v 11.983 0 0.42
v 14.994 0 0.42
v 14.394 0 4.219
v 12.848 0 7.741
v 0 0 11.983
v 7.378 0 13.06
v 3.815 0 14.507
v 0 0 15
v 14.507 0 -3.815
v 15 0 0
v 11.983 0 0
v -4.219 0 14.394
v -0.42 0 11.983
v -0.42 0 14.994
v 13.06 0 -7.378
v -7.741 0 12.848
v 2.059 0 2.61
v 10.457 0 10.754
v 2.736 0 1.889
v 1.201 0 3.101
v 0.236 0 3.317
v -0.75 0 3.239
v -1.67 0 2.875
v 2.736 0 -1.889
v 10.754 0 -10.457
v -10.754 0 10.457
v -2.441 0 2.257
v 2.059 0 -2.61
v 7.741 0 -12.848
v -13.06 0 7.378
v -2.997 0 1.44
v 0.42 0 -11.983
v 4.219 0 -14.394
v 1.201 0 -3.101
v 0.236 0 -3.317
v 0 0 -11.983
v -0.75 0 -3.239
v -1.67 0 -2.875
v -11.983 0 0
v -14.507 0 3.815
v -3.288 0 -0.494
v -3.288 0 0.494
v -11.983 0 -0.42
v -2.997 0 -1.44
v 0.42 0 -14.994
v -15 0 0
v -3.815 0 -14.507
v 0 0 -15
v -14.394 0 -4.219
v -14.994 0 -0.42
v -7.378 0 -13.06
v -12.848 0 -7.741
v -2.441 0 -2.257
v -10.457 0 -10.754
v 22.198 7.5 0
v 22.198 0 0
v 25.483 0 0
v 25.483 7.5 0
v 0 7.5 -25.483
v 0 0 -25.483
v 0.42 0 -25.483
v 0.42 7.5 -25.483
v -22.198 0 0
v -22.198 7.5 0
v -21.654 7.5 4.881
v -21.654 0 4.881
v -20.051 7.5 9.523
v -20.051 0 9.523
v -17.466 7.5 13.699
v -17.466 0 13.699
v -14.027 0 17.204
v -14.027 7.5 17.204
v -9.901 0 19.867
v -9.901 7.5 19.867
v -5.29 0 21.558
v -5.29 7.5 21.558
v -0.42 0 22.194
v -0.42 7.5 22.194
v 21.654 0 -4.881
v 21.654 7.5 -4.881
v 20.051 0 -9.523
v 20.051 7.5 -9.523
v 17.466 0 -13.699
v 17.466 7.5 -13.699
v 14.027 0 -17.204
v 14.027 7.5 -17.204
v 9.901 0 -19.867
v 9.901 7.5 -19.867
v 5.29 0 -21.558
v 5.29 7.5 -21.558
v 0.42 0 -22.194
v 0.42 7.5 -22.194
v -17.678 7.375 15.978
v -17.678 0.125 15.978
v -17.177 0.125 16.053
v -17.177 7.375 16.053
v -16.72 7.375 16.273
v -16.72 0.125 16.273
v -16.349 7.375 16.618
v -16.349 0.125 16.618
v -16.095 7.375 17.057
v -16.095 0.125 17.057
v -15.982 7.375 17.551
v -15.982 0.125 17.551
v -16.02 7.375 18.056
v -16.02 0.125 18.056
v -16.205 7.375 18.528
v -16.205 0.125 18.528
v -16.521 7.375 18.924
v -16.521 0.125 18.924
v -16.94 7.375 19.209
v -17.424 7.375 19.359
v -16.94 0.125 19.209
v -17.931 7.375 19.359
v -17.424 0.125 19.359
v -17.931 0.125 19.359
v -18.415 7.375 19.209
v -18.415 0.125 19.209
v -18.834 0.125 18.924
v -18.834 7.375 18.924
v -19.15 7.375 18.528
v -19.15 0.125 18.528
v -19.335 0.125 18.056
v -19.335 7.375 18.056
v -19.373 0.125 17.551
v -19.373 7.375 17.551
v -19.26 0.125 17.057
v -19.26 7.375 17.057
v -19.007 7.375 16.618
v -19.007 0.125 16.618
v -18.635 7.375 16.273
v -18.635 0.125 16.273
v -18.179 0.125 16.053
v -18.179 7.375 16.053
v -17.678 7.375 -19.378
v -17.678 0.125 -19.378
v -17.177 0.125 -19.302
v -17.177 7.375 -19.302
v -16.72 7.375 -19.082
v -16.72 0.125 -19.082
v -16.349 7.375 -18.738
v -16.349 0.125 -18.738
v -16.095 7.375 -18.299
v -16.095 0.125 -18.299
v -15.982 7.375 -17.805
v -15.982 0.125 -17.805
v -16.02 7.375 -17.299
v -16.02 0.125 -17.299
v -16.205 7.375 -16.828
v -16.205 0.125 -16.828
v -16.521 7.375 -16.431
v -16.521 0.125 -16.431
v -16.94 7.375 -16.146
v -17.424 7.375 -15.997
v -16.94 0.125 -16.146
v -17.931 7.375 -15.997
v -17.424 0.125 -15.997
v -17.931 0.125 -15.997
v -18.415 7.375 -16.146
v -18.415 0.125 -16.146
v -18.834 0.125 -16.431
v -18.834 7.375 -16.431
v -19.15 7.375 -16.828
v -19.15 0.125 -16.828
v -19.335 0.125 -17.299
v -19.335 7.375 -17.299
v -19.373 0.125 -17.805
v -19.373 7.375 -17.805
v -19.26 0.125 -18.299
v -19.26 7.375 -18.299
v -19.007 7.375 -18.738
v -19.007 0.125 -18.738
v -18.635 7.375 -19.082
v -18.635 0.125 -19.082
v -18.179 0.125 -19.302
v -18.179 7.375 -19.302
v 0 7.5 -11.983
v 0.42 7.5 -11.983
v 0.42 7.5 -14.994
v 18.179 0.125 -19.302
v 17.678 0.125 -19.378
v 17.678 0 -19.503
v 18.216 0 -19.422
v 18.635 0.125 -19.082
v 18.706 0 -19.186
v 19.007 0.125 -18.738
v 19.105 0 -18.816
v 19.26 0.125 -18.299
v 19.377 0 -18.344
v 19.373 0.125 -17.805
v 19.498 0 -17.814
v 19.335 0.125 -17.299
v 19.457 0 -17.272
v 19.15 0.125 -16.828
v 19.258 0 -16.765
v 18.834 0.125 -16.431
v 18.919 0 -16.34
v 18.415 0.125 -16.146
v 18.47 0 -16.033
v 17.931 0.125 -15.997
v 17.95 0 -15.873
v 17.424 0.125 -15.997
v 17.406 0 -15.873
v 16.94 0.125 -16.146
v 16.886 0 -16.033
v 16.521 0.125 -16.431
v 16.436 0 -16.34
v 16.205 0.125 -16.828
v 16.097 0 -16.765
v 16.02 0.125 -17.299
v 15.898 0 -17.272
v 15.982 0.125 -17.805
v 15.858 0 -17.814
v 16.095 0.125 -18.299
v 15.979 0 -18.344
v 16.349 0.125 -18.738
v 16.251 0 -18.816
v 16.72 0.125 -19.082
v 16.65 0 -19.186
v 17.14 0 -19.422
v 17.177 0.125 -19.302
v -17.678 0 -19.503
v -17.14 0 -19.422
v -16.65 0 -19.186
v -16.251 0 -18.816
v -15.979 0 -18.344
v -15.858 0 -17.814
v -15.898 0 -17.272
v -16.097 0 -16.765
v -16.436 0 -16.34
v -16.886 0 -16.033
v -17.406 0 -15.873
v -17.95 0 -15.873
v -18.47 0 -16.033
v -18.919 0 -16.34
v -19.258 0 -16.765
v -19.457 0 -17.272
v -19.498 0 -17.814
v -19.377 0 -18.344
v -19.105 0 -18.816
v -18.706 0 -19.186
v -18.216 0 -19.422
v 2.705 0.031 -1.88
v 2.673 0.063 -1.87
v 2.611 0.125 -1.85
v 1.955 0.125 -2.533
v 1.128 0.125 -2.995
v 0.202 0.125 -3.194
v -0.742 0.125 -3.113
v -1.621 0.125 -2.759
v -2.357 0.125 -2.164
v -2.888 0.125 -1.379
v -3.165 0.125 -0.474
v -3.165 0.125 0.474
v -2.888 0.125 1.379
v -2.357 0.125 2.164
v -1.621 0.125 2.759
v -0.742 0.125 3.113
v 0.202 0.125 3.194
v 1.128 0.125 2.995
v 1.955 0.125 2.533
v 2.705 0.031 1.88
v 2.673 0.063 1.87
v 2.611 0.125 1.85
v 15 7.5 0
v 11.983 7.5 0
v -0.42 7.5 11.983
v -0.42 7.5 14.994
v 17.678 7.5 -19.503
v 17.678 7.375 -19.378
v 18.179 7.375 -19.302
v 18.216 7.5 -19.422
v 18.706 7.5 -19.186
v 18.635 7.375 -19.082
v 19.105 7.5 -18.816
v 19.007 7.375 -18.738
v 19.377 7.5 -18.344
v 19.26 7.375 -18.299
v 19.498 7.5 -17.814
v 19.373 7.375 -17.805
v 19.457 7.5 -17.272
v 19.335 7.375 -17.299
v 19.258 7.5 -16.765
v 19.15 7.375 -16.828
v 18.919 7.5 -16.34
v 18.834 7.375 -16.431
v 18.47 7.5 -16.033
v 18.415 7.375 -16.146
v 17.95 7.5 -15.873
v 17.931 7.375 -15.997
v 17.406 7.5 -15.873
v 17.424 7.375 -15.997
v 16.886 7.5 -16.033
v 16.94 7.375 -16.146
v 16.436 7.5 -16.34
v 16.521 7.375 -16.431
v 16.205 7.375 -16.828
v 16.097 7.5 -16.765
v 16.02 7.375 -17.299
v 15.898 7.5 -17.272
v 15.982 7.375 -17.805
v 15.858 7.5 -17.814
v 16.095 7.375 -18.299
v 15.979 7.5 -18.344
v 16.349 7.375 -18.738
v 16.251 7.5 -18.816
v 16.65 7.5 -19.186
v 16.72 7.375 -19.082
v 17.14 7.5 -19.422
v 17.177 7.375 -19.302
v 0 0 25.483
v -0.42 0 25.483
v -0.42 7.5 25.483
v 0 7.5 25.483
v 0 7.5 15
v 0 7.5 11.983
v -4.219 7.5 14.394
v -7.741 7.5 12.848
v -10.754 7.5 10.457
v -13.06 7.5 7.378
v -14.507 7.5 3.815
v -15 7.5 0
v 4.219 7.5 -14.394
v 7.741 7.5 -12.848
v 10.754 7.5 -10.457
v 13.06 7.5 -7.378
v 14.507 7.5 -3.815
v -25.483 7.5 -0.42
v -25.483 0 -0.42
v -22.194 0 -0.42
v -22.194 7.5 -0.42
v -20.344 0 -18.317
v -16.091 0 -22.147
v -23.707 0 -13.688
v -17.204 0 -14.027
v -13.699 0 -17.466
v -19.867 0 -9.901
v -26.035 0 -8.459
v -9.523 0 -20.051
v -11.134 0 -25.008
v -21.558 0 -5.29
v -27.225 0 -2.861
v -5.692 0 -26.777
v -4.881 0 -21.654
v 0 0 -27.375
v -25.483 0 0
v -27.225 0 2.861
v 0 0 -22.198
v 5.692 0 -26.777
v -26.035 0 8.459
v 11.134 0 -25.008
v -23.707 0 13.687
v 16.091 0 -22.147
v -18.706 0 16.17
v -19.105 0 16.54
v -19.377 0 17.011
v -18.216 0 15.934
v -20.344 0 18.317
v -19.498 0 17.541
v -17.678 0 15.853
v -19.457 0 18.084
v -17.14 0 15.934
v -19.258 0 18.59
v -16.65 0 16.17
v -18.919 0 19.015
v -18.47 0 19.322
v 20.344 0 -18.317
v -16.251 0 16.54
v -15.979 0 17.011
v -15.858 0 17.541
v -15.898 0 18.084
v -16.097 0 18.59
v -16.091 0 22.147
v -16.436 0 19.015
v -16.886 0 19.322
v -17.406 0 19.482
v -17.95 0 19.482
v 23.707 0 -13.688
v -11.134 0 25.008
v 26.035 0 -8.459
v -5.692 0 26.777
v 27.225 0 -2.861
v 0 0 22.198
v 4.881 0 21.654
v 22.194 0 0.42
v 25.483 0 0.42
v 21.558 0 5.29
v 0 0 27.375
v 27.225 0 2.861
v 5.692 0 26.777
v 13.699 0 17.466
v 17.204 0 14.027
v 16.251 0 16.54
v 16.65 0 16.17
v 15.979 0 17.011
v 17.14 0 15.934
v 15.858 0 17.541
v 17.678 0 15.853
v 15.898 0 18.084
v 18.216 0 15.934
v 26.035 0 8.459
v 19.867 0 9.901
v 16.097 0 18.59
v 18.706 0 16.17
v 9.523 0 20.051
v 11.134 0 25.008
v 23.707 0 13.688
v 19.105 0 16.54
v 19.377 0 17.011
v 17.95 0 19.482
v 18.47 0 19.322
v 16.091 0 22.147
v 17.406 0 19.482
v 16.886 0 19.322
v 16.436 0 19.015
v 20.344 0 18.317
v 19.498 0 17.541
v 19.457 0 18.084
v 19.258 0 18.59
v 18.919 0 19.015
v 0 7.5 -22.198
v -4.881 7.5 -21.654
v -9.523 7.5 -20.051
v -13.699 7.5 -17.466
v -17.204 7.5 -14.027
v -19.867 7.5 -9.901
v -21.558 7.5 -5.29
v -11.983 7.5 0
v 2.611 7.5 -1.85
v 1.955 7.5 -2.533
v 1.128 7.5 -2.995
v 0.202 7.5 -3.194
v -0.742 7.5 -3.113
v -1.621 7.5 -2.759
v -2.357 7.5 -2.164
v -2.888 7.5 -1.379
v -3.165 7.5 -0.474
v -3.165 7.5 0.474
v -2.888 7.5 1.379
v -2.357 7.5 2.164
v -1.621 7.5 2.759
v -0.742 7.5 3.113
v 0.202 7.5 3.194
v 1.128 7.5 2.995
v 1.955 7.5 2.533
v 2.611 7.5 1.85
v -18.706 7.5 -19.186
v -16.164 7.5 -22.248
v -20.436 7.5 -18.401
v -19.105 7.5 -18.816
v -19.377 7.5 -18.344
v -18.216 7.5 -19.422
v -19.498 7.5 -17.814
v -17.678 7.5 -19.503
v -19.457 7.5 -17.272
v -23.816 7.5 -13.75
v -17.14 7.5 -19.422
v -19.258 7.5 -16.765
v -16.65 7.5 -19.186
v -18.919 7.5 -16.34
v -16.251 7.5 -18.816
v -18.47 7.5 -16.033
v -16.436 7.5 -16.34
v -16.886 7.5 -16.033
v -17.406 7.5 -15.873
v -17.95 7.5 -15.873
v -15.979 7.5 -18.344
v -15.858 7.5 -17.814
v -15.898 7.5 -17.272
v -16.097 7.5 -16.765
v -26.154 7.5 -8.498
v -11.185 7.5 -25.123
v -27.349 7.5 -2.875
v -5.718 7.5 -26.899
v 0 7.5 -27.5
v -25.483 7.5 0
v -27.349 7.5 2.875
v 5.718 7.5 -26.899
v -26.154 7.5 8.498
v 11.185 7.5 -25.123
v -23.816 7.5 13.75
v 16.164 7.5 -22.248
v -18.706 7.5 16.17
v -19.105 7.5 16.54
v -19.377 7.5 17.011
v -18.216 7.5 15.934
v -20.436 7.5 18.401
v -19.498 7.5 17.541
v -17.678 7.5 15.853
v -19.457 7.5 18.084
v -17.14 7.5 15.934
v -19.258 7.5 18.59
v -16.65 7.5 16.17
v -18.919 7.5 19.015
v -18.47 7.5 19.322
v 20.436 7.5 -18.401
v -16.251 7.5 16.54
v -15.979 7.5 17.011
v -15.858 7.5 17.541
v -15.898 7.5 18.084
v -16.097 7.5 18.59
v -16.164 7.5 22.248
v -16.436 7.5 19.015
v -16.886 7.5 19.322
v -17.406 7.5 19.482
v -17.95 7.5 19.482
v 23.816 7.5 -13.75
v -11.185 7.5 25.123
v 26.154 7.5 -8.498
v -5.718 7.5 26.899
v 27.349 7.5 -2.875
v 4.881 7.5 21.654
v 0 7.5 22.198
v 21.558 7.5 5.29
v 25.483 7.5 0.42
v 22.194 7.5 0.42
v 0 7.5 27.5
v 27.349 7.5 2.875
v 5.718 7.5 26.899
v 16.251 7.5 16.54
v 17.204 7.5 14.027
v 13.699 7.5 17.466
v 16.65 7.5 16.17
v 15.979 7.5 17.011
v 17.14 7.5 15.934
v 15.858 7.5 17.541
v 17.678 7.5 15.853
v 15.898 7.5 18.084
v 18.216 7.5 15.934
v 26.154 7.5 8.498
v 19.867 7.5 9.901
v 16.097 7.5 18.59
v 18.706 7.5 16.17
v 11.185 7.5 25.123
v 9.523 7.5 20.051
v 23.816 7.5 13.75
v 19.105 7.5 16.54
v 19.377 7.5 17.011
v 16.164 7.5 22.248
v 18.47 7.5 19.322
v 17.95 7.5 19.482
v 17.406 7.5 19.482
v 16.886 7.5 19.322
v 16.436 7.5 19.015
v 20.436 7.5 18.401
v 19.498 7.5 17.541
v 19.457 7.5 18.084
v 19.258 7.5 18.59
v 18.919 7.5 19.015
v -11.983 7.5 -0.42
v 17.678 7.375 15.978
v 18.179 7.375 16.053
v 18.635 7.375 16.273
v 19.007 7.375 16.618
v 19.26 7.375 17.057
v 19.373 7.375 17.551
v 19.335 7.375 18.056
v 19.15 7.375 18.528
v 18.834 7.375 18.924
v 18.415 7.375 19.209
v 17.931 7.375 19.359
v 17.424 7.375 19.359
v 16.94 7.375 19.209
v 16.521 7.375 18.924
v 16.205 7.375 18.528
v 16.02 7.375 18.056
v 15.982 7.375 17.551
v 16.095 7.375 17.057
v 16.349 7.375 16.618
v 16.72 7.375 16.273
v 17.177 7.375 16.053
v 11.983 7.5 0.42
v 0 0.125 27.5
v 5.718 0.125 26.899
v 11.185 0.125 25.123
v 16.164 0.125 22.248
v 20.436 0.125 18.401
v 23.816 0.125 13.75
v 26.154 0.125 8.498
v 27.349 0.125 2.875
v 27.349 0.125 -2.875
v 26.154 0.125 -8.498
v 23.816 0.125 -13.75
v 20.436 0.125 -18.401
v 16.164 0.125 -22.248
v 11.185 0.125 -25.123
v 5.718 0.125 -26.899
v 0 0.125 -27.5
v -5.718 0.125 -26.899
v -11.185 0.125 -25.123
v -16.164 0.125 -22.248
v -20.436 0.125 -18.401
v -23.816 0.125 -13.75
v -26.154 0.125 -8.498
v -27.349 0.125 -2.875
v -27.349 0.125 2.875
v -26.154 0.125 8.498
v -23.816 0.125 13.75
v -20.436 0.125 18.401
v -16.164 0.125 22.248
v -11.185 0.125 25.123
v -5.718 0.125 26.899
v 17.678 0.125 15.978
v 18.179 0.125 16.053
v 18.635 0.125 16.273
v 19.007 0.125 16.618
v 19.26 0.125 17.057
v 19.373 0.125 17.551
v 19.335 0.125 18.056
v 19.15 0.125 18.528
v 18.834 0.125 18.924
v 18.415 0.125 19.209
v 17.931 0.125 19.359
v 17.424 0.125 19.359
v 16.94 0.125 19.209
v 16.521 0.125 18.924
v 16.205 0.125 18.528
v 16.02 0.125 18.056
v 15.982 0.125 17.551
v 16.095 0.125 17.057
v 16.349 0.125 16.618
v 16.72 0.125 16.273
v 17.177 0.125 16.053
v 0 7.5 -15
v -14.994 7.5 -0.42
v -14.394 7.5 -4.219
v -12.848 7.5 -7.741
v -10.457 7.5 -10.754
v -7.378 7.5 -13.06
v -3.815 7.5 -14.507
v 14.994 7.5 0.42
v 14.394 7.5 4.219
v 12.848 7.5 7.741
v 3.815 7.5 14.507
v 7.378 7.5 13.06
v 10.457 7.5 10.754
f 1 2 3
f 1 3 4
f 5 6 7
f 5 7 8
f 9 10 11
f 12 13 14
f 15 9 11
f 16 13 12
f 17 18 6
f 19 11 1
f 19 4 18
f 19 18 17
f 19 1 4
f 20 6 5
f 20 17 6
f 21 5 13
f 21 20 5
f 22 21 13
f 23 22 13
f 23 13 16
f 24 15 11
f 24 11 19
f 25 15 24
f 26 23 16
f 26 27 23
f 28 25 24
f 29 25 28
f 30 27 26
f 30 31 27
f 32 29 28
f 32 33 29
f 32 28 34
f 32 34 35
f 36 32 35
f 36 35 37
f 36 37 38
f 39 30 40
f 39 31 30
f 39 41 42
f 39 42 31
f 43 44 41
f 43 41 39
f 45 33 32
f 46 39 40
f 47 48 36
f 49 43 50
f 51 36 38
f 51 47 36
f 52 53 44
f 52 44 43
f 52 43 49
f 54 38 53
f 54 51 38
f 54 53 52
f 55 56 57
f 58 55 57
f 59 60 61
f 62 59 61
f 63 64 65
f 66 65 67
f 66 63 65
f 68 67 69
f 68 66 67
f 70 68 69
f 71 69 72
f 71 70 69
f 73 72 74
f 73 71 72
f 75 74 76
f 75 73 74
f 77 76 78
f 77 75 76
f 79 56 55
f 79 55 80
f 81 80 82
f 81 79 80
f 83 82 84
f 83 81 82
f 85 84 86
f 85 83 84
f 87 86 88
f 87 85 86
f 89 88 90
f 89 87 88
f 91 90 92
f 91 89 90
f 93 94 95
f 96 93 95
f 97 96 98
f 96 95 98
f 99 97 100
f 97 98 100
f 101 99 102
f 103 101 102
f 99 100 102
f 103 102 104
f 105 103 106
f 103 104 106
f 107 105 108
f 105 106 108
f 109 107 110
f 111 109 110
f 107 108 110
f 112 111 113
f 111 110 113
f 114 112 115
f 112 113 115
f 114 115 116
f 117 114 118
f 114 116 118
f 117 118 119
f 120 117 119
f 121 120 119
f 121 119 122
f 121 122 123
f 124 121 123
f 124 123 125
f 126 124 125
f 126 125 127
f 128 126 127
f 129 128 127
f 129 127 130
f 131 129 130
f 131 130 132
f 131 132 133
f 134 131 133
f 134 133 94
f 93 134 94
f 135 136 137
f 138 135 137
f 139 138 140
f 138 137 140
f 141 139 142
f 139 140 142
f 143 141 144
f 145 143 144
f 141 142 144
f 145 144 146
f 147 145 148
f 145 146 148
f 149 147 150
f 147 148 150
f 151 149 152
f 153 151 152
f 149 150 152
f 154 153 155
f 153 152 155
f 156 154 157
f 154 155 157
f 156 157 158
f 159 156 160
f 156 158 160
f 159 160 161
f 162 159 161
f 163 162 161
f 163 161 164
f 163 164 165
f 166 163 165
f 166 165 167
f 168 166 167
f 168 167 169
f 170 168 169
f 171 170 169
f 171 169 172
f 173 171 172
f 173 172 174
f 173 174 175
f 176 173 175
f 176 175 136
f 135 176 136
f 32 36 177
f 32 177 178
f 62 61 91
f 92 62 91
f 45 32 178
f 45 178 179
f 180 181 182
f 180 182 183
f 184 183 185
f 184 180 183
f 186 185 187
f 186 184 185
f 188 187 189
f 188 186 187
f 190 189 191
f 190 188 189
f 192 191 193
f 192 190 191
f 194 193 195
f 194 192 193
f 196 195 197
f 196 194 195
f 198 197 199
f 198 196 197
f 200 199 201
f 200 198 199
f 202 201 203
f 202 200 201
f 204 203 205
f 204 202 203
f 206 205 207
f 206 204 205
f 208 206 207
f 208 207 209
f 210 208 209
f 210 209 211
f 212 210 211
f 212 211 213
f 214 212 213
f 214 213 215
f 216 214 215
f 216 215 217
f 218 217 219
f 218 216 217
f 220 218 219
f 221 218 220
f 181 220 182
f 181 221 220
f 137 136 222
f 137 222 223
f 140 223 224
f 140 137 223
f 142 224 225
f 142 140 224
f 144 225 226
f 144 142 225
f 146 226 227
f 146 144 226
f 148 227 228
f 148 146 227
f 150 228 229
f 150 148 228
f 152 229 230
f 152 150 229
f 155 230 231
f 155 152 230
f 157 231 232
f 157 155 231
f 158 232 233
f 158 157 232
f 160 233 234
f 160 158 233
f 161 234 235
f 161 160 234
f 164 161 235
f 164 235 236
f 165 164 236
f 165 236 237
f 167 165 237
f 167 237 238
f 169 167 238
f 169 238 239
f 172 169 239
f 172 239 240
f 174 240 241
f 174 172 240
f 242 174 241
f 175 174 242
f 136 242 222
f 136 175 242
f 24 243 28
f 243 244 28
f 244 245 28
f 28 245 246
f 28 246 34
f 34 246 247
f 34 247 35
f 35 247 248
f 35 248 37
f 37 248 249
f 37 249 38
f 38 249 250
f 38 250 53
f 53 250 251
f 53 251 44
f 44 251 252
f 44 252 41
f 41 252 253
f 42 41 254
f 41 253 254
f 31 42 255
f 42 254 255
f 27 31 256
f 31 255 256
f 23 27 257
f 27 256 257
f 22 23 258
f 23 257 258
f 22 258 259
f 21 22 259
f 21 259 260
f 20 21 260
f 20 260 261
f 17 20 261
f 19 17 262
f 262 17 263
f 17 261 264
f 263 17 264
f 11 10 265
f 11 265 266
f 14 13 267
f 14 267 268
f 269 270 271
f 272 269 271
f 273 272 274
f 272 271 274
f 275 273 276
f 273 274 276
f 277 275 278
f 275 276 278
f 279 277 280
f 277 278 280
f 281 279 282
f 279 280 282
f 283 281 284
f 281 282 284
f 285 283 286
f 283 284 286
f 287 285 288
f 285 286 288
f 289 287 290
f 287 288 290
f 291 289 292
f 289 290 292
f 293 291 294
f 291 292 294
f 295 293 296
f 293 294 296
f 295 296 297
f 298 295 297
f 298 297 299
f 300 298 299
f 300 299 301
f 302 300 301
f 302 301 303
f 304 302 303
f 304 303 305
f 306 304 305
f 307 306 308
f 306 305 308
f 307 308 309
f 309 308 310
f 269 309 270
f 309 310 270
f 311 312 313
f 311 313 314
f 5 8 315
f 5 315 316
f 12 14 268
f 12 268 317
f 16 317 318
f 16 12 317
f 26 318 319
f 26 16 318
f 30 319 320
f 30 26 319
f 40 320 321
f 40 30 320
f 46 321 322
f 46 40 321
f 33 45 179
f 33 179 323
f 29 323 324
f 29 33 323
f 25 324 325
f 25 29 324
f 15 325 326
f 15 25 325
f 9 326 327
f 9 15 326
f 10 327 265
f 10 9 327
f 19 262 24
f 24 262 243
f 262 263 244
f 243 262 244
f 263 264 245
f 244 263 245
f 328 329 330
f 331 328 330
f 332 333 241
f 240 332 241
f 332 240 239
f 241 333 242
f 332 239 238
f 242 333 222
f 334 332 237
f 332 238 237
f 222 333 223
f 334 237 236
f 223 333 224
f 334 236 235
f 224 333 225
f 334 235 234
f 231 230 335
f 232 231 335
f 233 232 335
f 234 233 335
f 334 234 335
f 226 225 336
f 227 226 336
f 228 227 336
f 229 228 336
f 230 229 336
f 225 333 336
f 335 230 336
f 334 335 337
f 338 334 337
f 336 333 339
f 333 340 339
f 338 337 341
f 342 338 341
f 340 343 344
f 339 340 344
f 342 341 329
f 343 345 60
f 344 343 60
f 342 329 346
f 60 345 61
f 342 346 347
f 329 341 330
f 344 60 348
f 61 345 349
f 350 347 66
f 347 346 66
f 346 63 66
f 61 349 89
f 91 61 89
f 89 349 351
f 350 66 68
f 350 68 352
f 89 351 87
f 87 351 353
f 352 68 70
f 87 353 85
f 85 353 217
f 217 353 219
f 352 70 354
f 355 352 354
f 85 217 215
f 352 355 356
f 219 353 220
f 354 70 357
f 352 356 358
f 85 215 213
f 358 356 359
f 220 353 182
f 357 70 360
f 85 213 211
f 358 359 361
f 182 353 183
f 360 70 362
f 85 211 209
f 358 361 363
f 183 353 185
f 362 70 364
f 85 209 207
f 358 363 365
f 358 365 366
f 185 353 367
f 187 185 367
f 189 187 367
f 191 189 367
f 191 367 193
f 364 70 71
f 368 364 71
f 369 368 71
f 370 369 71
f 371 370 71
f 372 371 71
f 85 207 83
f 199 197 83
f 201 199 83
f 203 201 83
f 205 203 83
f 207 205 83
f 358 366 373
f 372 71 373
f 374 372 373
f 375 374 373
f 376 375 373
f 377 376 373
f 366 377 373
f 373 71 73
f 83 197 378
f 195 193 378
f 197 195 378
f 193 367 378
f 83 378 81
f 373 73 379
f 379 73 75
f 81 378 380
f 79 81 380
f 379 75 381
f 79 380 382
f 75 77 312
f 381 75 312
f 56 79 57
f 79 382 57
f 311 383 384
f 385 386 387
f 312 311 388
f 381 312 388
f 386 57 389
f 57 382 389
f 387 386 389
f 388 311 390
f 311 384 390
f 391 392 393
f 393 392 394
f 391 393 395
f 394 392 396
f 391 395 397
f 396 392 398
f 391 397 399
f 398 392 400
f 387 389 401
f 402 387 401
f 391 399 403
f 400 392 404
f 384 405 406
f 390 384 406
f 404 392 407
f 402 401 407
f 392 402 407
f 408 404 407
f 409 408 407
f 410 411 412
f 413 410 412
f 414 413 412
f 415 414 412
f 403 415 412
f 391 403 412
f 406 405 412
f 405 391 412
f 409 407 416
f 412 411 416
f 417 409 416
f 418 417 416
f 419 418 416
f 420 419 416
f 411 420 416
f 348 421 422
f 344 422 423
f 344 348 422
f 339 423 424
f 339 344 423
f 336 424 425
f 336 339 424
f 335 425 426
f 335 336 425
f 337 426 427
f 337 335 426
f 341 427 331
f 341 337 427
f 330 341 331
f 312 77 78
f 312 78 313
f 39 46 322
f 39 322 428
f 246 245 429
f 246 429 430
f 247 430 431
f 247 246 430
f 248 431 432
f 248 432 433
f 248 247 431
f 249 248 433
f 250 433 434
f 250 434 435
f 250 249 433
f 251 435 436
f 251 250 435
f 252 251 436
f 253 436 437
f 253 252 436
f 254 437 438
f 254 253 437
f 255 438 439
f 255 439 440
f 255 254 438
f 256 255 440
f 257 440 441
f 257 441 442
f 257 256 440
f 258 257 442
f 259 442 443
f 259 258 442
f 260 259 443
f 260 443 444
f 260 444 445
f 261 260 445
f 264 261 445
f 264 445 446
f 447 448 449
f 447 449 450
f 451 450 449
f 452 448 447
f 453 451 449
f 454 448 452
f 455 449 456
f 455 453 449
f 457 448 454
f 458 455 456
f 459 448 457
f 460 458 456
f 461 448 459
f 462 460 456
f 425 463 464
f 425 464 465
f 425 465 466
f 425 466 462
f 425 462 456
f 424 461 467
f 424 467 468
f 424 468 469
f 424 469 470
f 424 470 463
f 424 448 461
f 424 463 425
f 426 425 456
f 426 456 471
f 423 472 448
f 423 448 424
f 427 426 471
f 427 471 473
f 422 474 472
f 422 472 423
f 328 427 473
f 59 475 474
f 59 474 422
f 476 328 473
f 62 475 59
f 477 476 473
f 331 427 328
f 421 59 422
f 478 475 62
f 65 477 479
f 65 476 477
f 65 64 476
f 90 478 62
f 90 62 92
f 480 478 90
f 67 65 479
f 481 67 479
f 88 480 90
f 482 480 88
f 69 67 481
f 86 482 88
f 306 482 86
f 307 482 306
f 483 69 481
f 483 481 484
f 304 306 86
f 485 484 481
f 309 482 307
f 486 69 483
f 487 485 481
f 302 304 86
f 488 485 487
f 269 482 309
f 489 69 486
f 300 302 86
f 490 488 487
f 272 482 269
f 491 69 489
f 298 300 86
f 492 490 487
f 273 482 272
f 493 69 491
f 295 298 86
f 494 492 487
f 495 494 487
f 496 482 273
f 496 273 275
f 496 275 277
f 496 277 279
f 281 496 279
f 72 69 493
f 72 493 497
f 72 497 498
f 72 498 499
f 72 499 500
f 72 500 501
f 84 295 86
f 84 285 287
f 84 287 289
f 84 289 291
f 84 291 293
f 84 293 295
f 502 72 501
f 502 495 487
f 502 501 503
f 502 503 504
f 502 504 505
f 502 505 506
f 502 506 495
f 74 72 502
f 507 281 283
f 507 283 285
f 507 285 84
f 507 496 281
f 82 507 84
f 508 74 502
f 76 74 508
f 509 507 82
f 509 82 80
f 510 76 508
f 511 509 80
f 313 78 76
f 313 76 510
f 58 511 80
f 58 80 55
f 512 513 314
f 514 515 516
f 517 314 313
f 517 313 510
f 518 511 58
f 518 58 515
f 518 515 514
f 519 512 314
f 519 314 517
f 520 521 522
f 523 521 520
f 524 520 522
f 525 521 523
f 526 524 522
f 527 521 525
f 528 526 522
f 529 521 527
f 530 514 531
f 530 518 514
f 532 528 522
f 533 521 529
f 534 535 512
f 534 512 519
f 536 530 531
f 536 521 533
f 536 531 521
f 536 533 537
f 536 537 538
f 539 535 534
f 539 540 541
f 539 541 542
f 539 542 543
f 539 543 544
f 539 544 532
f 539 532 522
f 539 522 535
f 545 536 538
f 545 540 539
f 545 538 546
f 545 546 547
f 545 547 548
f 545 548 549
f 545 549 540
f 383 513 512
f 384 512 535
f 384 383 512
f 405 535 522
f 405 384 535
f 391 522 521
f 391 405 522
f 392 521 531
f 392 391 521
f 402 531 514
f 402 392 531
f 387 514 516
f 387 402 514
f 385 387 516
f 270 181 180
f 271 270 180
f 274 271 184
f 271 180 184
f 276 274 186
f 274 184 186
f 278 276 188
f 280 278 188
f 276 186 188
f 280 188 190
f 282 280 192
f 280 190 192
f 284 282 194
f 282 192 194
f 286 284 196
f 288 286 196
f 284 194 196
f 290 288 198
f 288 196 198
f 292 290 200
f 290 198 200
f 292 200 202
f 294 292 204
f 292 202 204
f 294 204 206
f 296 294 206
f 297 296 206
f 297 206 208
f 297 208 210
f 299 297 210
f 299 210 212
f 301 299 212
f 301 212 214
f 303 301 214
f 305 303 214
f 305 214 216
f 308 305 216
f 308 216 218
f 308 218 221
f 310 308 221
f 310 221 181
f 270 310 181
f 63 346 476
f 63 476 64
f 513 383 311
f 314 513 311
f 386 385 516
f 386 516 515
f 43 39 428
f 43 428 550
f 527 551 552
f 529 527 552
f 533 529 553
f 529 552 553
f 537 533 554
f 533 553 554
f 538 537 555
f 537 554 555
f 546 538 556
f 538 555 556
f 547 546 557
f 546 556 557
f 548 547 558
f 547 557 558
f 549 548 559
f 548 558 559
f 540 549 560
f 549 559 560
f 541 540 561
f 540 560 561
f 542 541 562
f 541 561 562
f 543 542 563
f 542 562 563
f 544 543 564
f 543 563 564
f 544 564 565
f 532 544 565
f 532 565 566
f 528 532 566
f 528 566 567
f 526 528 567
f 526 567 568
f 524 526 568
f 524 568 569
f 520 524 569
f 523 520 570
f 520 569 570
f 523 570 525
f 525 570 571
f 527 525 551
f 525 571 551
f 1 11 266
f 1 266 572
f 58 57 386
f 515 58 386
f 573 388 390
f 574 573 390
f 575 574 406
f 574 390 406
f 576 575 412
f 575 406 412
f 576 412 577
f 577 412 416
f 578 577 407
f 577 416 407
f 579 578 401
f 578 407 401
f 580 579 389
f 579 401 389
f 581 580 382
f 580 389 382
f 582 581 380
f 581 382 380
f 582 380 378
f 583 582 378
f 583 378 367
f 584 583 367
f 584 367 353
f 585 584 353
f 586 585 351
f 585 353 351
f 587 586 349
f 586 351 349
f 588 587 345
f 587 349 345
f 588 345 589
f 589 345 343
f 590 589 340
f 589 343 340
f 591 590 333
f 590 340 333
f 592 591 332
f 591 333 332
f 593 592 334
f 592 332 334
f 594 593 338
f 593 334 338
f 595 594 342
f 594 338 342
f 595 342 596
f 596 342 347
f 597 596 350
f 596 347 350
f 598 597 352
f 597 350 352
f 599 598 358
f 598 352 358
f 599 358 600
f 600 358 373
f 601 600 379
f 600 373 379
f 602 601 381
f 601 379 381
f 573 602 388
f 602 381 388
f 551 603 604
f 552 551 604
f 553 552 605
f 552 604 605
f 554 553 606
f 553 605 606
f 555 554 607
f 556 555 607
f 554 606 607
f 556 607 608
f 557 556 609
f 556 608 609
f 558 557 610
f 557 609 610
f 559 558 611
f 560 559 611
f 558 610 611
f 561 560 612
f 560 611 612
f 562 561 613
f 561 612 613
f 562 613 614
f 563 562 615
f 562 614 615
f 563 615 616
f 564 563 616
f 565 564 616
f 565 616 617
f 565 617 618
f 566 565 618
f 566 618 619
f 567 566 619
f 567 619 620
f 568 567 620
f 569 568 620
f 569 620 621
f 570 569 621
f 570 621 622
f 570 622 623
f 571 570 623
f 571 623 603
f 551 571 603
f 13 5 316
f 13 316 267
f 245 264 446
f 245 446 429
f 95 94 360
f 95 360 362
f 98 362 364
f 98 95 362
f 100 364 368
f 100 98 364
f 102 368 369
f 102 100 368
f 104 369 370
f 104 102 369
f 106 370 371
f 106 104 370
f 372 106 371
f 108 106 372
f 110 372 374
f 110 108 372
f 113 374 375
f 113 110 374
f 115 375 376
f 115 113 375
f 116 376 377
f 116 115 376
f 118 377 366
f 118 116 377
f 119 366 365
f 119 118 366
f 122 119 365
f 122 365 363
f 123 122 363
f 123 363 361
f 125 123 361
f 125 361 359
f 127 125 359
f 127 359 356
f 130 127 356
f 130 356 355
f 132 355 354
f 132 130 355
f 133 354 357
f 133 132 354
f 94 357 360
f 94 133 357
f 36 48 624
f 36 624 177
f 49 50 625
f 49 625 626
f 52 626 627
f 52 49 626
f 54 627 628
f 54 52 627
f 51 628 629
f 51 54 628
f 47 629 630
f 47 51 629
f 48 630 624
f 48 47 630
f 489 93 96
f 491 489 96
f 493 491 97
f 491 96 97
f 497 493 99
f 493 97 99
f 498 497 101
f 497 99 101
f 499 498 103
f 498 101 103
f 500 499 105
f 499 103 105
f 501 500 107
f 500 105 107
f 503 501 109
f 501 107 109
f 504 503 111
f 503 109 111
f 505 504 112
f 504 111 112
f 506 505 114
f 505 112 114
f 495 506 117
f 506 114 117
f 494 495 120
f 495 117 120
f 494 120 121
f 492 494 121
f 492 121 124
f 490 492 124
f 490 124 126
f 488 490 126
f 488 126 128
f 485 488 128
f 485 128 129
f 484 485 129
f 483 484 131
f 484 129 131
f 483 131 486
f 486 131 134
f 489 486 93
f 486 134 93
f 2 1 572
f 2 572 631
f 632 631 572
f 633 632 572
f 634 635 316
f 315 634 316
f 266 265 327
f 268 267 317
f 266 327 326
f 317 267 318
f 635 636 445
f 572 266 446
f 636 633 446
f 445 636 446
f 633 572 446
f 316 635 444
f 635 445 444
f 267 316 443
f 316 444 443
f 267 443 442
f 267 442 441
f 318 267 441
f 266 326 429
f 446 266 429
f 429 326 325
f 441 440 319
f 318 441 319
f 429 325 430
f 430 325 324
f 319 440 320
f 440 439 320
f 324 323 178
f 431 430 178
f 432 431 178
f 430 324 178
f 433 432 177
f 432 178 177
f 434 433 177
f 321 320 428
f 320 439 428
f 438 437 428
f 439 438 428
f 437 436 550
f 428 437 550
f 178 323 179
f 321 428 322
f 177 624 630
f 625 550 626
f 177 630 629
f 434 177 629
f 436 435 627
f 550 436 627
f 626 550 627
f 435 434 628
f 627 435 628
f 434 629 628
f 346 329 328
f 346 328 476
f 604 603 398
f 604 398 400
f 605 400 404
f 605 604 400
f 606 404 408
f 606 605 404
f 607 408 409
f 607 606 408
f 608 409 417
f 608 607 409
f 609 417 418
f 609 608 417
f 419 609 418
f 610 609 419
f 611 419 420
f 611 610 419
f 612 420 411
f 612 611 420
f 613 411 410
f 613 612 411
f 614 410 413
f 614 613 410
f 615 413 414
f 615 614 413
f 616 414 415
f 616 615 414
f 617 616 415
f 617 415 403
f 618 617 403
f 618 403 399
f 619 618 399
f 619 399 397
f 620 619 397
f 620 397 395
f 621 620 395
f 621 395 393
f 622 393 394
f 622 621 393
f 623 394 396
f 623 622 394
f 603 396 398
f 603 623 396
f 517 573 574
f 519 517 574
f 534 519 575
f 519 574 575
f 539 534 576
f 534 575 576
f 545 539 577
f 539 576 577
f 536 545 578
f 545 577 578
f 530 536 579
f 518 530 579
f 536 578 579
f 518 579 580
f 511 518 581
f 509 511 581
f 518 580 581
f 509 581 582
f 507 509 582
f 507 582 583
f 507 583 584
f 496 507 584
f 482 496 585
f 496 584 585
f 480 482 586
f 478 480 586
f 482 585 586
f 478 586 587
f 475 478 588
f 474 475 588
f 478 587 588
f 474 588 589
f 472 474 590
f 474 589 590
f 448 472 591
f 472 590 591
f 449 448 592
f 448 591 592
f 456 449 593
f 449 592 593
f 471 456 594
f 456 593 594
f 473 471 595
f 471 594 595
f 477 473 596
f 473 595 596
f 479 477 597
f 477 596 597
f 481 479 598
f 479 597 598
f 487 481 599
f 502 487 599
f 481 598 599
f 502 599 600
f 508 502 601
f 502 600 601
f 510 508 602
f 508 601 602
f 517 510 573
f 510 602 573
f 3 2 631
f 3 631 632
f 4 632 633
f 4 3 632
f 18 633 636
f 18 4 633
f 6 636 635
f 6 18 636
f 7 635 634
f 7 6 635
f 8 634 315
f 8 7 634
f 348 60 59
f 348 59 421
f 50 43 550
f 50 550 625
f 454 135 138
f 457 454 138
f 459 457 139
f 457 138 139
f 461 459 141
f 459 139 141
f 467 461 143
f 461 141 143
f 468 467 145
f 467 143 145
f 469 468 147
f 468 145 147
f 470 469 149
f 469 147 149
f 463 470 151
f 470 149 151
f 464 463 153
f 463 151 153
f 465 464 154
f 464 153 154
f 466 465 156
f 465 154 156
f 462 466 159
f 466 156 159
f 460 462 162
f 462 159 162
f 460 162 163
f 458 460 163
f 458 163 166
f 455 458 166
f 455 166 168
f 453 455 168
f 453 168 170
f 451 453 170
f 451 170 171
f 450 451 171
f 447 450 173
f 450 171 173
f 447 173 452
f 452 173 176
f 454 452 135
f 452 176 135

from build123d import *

# Parameters (mm, degrees)
SKETCH2_R             = 27.5
SKETCH2_R_2           = 22.197520882
BOSS_EXTRUDE3_DEPTH   = 7.5
BOSS_EXTRUDE3_2_DEPTH = 7.5
SKETCH5_R             = 1.7
SKETCH5_W             = 0.42
SKETCH5_H             = 13.5
SKETCH5_W_2           = 13.5
SKETCH5_H_2           = 0.42
CUT_EXTRUDE6_DEPTH    = 40.607448794
CUT_EXTRUDE8_DEPTH    = 7.5
CHAMFER3_SIZE         = 0.125
CHAMFER4_SIZE         = 0.125


with BuildPart() as part:
    # Sketch2 → Boss-Extrude3 (new body)
    with BuildSketch(Plane(origin=(0, 0, 0), x_dir=(1, 0, 0), z_dir=(0, 1, 0))):
        with Locations(Location((0, 0, 0), (0, 0, 270))):
            Circle(SKETCH2_R)
        with Locations(Location((0, 0, 0), (0, 0, 270))):
            Circle(SKETCH2_R_2, mode=Mode.SUBTRACT)
    extrude(amount=BOSS_EXTRUDE3_DEPTH)

    # Sketch5 → Cut-Extrude6 (cut, through all)
    with BuildSketch(Plane.XZ):
        with Locations(Location((-17.67766953, 17.67766953, 0), (0, 0, 270))):
            Circle(SKETCH5_R)
        with Locations(Location((17.67766953, 17.67766953, 0), (0, 0, 270))):
            Circle(SKETCH5_R)
        with Locations(Location((17.67766953, -17.67766953, 0), (0, 0, 270))):
            Circle(SKETCH5_R)
        with Locations(Location((-17.67766953, -17.67766953, 0), (0, 0, 270))):
            Circle(SKETCH5_R)
        with Locations((0.21, -18.733167206)):
            Rectangle(SKETCH5_W, SKETCH5_H)
        with Locations((-18.733167206, -0.21)):
            Rectangle(SKETCH5_W_2, SKETCH5_H_2)
        with Locations((-0.21, 18.733167206)):
            Rectangle(SKETCH5_W, SKETCH5_H)
        with Locations((18.733167206, 0.21)):
            Rectangle(SKETCH5_W_2, SKETCH5_H_2)
    extrude(amount=-CUT_EXTRUDE6_DEPTH, mode=Mode.SUBTRACT)

    # Chamfer4
    chamfer4_edges = [part.edges().sort_by_distance(p)[0] for p in [
        (0, 0, -27.5),
        (-17.67766953, 7.5, 19.37766953),
        (-17.67766953, 0, 19.37766953),
        (17.67766953, 7.5, 19.37766953),
        (17.67766953, 0, 19.37766953),
        (17.67766953, 7.5, -15.97766953),
        (17.67766953, 0, -15.97766953),
        (-17.67766953, 7.5, -15.97766953),
        (-17.67766953, 0, -15.97766953),
    ]]
    chamfer(chamfer4_edges, length=CHAMFER4_SIZE)


with BuildPart() as body_2:
    # Sketch2 → Boss-Extrude3 2 (new body)
    with BuildSketch(Plane(origin=(0, 0, 0), x_dir=(1, 0, 0), z_dir=(0, 1, 0))):
        with BuildLine():
            Line((0, -15), (0, -11.983167206))
            Line((0, -11.983167206), (-0.42, -11.983167206))
            Line((-0.42, -11.983167206), (-0.42, -14.994118847))
            ThreePointArc((-0.42, -14.994118847), (-10.754068997, -10.457055035), (-15, 0))
            Line((-15, 0), (-11.983167206, 0))
            Line((-11.983167206, 0), (-11.983167206, 0.42))
            Line((-11.983167206, 0.42), (-14.994118847, 0.42))
            ThreePointArc((-14.994118847, 0.42), (-10.457055035, 10.754068997), (0, 15))
            Line((0, 15), (0, 11.983167206))
            Line((0, 11.983167206), (0.42, 11.983167206))
            Line((0.42, 11.983167206), (0.42, 14.994118847))
            ThreePointArc((0.42, 14.994118847), (10.754068997, 10.457055035), (15, 0))
            Line((15, 0), (11.983167206, 0))
            Line((11.983167206, 0), (11.983167206, -0.42))
            Line((11.983167206, -0.42), (14.994118847, -0.42))
            ThreePointArc((14.994118847, -0.42), (10.457055035, -10.754068997), (0, -15))
        make_face()
    extrude(amount=BOSS_EXTRUDE3_2_DEPTH)

    # Sketch7 → Cut-Extrude8 (cut)
    with BuildSketch(Plane.XZ):
        with BuildLine():
            Line((2.611025673, 1.850012144), (2.611025673, -1.850012144))
            ThreePointArc((2.611025673, -1.850012144), (-3.2, 0), (2.611025673, 1.850012144))
        make_face()
    extrude(amount=-CUT_EXTRUDE8_DEPTH, mode=Mode.SUBTRACT)

    # Chamfer3
    chamfer3_edges = [body_2.edges().sort_by_distance(p)[0] for p in [
        (2.611025673, 0, 0),
        (-3.2, 0, 0),
    ]]
    chamfer(chamfer3_edges, length=CHAMFER3_SIZE)


solid = Compound([part.part, body_2.part])
